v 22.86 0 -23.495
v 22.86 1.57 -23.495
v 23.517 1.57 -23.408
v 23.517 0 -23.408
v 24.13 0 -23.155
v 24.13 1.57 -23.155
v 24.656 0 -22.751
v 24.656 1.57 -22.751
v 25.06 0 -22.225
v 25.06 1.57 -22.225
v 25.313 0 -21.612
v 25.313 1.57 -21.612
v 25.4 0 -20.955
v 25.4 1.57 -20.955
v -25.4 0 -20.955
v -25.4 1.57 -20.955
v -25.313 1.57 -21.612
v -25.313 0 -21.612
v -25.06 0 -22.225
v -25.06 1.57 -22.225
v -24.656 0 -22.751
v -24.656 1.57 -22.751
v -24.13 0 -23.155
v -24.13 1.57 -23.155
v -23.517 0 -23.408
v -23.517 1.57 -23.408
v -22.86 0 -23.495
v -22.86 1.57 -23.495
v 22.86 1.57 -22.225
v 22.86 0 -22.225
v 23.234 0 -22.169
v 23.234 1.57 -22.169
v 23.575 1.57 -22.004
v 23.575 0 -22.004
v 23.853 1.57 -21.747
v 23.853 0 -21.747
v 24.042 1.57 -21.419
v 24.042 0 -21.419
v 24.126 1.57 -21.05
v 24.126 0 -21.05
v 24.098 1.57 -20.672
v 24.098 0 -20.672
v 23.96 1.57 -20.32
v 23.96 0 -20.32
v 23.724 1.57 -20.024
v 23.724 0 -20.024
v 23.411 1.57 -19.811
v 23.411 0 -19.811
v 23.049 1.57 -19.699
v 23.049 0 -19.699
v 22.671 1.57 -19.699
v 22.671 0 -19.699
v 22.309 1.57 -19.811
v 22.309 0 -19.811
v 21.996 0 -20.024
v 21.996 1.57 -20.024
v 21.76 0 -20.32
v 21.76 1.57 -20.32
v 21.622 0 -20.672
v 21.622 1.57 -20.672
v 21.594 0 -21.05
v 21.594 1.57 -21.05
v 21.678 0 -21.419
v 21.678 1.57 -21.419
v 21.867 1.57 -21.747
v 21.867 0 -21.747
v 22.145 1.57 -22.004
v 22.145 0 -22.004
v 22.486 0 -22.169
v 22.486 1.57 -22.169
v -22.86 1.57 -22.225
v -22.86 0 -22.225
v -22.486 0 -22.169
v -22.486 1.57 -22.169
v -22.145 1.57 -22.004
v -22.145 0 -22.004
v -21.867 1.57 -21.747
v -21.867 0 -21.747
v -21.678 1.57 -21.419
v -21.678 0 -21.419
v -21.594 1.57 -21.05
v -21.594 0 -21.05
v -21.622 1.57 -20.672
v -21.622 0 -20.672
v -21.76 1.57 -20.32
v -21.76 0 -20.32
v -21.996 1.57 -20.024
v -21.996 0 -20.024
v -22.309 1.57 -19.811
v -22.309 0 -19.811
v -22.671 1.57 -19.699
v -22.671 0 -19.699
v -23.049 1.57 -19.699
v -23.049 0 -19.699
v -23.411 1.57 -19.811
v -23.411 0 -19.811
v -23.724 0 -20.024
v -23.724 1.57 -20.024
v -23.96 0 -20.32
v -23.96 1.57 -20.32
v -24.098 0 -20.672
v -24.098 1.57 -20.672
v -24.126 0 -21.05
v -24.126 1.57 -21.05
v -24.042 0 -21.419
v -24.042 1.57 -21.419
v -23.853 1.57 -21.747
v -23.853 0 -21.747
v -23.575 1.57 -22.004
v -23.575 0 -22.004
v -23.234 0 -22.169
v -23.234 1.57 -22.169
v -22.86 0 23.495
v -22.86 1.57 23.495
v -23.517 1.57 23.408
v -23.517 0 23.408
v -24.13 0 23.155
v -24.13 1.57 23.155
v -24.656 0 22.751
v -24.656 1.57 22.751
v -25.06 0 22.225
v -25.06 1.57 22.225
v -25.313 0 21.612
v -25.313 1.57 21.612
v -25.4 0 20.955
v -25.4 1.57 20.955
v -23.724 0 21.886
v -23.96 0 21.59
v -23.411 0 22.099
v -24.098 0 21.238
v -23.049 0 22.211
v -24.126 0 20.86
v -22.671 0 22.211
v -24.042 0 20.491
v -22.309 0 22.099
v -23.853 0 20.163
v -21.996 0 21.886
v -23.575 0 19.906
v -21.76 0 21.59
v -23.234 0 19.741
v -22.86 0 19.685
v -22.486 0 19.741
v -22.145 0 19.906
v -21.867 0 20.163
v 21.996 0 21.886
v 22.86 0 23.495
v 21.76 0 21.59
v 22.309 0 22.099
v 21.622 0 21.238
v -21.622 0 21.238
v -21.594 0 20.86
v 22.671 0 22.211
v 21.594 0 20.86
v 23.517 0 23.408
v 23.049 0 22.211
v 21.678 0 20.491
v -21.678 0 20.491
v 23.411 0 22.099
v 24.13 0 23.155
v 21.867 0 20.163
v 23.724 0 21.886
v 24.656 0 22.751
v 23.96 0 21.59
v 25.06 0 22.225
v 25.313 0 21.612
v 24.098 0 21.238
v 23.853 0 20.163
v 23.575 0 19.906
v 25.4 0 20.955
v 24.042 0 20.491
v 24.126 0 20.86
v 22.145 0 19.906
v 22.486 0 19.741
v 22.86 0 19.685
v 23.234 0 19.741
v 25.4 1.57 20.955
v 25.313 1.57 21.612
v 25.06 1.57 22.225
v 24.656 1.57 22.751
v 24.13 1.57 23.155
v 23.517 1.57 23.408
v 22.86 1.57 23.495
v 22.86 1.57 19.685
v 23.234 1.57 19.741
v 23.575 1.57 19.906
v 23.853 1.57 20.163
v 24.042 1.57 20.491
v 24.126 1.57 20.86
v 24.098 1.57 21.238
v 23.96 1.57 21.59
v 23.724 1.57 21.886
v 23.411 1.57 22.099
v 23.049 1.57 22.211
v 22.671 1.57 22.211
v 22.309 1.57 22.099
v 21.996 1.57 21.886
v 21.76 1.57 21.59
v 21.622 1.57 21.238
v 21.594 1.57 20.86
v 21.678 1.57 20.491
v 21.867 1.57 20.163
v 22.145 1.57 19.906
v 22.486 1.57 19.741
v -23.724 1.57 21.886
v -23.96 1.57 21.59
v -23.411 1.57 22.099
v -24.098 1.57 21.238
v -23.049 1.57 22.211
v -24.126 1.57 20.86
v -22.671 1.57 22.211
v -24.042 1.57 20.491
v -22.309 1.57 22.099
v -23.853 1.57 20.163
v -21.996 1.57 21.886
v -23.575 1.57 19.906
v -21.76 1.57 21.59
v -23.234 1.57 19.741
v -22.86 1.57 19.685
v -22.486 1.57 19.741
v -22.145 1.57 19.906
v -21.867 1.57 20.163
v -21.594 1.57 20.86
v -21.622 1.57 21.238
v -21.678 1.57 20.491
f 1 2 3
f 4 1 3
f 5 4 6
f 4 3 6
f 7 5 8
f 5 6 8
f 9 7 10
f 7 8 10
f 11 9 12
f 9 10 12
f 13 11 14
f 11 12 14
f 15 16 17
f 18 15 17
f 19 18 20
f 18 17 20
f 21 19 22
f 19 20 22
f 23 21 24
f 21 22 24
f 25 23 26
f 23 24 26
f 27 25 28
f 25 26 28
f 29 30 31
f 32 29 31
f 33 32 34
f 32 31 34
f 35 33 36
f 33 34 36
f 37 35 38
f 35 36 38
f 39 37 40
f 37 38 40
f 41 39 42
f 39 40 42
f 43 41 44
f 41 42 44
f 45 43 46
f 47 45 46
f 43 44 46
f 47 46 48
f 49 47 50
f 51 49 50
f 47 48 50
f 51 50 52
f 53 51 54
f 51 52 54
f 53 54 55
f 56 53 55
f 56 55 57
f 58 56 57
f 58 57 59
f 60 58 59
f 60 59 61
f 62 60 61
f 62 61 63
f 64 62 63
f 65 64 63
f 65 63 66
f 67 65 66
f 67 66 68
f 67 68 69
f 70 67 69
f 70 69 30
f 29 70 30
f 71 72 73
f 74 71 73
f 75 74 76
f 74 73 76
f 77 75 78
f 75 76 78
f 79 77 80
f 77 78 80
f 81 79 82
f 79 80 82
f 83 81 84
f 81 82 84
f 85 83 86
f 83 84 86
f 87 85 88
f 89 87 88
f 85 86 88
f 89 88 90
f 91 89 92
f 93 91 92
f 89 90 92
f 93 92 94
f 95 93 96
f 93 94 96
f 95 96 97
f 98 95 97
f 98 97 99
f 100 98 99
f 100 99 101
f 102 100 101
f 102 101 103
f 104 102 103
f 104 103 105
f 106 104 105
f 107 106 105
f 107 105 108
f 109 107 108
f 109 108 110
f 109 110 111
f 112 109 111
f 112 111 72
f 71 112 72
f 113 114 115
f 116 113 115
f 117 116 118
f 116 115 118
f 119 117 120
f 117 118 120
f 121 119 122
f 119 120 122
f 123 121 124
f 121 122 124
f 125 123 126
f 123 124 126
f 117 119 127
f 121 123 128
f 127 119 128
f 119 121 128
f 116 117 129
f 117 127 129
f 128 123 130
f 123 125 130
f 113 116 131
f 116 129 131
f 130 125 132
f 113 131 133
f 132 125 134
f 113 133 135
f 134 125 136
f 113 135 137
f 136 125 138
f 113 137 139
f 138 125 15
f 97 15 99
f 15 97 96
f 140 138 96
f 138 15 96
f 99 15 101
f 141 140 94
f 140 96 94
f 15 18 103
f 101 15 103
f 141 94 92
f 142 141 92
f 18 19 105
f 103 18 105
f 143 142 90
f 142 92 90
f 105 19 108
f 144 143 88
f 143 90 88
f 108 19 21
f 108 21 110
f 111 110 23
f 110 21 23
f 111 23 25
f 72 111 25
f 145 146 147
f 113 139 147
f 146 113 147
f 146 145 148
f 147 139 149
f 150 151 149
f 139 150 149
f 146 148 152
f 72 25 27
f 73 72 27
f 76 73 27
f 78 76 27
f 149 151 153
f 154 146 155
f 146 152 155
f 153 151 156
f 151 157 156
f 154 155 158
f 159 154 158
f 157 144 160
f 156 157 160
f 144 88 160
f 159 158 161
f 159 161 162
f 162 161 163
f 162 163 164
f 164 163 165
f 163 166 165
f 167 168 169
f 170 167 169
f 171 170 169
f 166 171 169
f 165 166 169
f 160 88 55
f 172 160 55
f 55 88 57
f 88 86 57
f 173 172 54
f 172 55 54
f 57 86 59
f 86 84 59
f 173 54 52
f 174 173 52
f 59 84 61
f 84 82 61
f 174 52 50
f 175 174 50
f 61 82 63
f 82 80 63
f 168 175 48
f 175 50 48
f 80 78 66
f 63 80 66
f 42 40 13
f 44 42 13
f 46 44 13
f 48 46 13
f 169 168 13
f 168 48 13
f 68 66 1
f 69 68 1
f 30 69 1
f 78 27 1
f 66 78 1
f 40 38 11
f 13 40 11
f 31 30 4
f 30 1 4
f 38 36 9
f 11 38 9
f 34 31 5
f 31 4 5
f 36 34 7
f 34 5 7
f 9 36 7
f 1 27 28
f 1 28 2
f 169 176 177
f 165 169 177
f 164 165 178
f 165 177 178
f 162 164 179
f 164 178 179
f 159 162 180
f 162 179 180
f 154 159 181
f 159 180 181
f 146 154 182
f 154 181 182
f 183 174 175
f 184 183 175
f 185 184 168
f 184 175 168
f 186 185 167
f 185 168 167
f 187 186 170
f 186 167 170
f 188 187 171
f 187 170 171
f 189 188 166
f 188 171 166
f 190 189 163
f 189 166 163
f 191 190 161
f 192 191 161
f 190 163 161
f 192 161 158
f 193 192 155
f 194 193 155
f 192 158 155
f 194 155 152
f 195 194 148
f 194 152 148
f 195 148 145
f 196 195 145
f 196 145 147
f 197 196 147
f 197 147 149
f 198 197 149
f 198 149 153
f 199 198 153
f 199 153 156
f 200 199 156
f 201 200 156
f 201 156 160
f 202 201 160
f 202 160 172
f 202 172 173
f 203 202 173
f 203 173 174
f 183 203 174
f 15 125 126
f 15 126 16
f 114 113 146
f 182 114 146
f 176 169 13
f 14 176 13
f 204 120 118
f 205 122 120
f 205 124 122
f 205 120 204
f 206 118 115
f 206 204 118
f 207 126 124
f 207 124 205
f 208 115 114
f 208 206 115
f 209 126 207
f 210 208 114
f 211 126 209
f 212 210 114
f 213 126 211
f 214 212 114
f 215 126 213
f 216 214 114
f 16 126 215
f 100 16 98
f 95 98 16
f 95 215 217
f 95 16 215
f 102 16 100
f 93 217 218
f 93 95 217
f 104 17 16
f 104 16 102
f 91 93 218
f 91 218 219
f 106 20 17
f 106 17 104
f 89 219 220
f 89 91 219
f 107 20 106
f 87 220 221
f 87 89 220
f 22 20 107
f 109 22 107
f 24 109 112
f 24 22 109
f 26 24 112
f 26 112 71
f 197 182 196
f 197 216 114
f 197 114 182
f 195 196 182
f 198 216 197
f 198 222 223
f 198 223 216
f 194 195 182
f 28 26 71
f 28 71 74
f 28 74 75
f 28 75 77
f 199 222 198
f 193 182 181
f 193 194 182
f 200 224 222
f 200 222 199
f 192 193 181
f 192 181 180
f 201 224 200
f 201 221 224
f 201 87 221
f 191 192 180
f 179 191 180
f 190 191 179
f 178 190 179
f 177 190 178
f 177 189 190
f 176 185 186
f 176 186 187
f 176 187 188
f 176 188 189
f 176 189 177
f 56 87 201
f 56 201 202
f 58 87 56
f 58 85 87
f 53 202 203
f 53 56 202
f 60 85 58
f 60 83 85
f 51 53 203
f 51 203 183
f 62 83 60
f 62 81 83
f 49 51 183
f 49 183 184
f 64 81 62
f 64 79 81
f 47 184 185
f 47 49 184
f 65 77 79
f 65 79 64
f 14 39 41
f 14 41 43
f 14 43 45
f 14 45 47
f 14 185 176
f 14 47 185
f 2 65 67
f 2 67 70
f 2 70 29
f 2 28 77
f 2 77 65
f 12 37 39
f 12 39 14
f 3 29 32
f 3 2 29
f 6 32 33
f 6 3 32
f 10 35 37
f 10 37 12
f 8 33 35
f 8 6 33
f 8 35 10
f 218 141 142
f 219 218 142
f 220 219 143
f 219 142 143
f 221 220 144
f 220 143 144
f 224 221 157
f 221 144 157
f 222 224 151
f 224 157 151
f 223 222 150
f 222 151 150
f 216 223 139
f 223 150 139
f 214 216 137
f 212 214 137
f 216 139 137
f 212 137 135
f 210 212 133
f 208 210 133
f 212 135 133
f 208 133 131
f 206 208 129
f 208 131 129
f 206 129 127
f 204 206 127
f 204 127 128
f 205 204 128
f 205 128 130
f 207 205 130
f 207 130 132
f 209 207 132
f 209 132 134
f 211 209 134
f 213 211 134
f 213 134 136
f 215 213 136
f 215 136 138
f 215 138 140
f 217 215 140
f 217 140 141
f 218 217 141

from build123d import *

# Parameters (mm, degrees)
SKETCH1_W                = 50.8
SKETCH1_H                = 46.99
BOSS_EXTRUDE1_DEPTH      = 1.57
F_1_16_0_1_DOWEL_HOLE1_D = 2.54
CUT_EXTRUDE1_DEPTH       = 35.635818526


with BuildPart() as part:
    # Sketch1 → Boss-Extrude1 (new body)
    with BuildSketch(Plane(origin=(0, 0, 0), x_dir=(1, 0, 0), z_dir=(0, 1, 0))):
        Rectangle(SKETCH1_W, SKETCH1_H)
    extrude(amount=BOSS_EXTRUDE1_DEPTH)

    # 1/16 (0.1) Dowel Hole1 (through all)
    with Locations(Plane(origin=(-22.86, 1.57, -20.955), x_dir=(0, 0, 1), z_dir=(0, 1, 0))):
        with Locations((0, 0), (0, 45.72), (41.91, 45.72), (41.91, 0)):
            Hole(F_1_16_0_1_DOWEL_HOLE1_D / 2)

    # Sketch2 → Cut-Extrude1 (cut, through all)
    with BuildSketch(Plane(origin=(0, 1.57, 0), x_dir=(1, 0, 0), z_dir=(0, 1, 0))):
        with BuildLine():
            Line((-25.4, 23.495), (-25.4, 20.955))
            ThreePointArc((-25.4, 20.955), (-24.656051224, 22.751051224), (-22.86, 23.495))
            Line((-22.86, 23.495), (-25.4, 23.495))
        make_face()
        with BuildLine():
            Line((25.4, 23.495), (22.86, 23.495))
            ThreePointArc((22.86, 23.495), (24.656051224, 22.751051224), (25.4, 20.955))
            Line((25.4, 20.955), (25.4, 23.495))
        make_face()
        with BuildLine():
            ThreePointArc((25.4, -20.955), (24.656051224, -22.751051224), (22.86, -23.495))
            Line((22.86, -23.495), (25.4, -23.495))
            Line((25.4, -23.495), (25.4, -20.955))
        make_face()
        with BuildLine():
            ThreePointArc((-22.86, -23.495), (-24.656051224, -22.751051224), (-25.4, -20.955))
            Line((-25.4, -20.955), (-25.4, -23.495))
            Line((-25.4, -23.495), (-22.86, -23.495))
        make_face()
    extrude(amount=-CUT_EXTRUDE1_DEPTH, mode=Mode.SUBTRACT)


solid = part.part
